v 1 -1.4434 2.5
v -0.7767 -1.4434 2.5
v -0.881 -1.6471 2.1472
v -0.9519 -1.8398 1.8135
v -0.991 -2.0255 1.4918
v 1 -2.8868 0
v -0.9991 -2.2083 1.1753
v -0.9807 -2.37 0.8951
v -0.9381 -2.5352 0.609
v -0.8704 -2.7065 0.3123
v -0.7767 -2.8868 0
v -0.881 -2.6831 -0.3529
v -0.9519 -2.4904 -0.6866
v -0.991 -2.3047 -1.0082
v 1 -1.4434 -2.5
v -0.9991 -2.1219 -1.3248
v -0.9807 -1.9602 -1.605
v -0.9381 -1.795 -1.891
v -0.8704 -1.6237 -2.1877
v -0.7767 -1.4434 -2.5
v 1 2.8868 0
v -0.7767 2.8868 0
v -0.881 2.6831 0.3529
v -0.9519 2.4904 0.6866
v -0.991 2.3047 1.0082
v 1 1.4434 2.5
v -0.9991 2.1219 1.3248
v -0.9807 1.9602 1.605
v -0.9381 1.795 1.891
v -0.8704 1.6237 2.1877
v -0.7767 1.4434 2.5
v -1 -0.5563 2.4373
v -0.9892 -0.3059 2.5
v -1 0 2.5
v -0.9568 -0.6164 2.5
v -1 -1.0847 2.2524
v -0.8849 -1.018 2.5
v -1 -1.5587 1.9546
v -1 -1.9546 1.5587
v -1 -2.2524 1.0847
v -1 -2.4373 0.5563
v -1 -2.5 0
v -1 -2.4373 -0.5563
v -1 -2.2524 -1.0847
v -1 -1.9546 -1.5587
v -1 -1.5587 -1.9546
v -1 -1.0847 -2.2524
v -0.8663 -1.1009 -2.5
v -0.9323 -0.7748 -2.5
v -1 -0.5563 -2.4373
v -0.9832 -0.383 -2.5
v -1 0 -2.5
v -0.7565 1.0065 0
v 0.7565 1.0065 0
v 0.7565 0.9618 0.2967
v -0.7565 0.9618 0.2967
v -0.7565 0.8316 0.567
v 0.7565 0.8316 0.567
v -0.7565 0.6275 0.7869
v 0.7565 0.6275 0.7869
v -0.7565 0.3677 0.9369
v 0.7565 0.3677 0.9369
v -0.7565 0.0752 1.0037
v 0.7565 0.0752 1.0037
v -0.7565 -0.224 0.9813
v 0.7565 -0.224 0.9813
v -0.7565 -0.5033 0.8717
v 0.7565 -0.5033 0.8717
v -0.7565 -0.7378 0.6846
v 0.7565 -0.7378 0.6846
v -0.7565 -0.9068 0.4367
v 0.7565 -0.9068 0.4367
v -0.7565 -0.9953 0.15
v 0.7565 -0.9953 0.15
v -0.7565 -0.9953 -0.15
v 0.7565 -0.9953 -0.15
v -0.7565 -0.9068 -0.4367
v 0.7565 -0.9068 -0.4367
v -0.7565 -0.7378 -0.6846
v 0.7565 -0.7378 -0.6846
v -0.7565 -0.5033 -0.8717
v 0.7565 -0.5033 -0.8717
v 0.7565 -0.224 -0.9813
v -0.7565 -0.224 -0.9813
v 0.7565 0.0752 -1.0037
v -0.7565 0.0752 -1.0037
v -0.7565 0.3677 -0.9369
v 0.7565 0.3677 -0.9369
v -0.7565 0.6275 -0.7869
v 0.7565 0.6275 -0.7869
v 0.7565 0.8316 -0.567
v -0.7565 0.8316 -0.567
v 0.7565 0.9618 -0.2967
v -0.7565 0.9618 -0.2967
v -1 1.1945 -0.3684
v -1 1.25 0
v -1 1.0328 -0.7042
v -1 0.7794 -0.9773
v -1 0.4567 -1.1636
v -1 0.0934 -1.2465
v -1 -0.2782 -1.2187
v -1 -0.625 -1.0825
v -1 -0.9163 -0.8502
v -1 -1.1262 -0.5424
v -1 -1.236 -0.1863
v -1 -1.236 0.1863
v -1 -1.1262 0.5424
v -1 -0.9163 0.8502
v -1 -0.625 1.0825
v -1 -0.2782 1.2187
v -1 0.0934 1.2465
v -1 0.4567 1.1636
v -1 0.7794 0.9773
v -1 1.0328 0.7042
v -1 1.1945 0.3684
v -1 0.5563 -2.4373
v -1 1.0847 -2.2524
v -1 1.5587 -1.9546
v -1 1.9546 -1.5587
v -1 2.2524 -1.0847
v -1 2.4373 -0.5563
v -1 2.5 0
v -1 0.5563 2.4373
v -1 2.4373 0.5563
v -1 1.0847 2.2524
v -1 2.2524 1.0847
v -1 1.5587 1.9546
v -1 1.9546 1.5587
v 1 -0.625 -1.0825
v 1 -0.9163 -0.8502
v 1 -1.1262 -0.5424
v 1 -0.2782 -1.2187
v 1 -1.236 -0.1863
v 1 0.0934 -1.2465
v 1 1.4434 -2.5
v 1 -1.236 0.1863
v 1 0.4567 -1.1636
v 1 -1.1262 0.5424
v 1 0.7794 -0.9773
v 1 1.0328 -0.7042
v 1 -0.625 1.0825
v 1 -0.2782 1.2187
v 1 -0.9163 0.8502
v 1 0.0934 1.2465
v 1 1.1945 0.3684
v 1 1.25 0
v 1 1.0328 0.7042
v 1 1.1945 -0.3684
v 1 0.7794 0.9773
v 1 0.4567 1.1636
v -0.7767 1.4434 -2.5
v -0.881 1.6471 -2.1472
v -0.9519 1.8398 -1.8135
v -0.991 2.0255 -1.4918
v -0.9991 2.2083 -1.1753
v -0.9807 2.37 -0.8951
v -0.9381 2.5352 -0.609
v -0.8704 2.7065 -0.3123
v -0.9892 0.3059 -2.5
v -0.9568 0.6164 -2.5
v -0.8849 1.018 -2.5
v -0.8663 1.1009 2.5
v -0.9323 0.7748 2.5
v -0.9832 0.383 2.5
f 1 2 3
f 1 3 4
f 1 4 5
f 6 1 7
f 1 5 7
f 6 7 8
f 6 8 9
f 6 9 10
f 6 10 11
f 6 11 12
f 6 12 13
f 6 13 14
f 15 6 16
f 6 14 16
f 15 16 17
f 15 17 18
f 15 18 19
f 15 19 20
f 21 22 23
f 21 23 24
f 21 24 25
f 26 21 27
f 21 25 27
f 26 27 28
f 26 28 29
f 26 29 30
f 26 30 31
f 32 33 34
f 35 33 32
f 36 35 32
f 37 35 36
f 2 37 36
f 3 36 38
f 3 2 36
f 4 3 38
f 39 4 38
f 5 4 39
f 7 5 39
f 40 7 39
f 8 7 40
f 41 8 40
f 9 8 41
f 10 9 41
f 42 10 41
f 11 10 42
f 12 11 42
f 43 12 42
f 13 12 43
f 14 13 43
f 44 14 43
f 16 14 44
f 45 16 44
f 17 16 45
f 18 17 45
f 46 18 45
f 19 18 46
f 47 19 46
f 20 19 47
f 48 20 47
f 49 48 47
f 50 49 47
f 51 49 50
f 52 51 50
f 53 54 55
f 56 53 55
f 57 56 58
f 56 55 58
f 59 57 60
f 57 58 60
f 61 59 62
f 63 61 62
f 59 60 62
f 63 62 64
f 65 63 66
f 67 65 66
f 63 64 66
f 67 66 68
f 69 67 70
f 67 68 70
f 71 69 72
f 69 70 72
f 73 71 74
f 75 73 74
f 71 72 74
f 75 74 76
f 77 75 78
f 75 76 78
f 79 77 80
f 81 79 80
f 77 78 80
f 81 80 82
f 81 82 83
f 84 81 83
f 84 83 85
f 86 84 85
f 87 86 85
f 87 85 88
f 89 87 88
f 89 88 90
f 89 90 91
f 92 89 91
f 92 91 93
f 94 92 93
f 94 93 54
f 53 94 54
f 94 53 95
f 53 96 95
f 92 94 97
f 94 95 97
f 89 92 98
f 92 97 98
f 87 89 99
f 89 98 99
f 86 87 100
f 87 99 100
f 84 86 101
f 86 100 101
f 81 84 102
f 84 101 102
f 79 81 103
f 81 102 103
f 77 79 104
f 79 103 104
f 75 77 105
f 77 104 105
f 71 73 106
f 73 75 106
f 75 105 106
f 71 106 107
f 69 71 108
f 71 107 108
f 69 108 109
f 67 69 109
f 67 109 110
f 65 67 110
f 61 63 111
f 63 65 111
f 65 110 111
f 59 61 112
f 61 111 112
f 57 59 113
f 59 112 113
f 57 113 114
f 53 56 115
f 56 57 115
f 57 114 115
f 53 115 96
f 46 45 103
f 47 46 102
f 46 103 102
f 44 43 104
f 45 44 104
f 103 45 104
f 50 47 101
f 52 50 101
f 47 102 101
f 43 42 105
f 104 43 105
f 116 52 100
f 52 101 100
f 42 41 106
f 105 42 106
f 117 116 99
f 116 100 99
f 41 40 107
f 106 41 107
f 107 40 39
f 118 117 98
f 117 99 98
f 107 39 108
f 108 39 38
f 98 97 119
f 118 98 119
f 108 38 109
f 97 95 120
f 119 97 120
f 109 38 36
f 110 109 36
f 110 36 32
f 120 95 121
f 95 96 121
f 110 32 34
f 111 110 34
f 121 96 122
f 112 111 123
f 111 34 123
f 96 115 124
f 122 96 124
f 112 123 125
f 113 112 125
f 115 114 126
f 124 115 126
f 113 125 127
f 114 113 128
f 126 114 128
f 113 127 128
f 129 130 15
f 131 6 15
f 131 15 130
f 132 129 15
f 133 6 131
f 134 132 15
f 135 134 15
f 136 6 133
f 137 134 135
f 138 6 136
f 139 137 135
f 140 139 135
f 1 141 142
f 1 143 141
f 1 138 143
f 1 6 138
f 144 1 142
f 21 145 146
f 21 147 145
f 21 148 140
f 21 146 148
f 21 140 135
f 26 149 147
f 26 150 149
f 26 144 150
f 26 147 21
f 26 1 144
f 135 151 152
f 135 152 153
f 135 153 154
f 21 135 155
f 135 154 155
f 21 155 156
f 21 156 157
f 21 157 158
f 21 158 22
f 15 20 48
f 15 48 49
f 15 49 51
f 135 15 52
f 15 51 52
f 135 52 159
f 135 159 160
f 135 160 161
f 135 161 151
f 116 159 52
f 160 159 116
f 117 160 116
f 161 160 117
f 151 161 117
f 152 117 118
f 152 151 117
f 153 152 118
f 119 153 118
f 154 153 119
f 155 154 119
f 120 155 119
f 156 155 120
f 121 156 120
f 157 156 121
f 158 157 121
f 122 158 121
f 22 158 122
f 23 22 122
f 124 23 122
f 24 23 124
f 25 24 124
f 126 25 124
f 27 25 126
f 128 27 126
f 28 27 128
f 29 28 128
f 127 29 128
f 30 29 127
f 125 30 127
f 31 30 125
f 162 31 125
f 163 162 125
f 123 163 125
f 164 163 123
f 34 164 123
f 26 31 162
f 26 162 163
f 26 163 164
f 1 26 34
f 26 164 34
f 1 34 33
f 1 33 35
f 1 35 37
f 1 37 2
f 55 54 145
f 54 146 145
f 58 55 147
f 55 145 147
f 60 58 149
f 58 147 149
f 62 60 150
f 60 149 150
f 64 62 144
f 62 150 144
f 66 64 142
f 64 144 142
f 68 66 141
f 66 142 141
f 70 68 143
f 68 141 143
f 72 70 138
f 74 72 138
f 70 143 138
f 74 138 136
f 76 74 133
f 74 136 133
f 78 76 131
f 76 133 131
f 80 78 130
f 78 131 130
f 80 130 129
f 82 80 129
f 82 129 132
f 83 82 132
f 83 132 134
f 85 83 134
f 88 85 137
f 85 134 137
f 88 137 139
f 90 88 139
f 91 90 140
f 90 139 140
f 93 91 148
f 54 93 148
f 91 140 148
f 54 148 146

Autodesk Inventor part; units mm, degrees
sketch "Sketch_1" plane through (0, 0, 0) normal (0, 0, 1) x (1, 0, 0)
  line L0 (1, 0) -> (-1, 0)
  line L1 (-1, 0) -> (-1, 2.5)
  line L2 (-1, 2.5) -> (-0.7691, 2.9)
  line L3 (-0.7691, 2.9) -> (1, 2.9)
  line L4 (1, 2.9) -> (1, 0)
  line L5 (1, 0) -> (-1, 0)
revolve "Revolution1" add sketch "Sketch_1" angle 360 about axis through (1, 0, 0) along (1, 0, 0)
sketch "Sketch_2" plane through (0, 0, 0) normal (0, 0, 1) x (1, 0, 0)
  line L0 (1, 0) -> (-1, 0)
  line L1 (-1, 0) -> (-1, 1.25)
  line L2 (-1, 1.25) -> (-0.7565, 1.0065)
  line L3 (-0.7565, 1.0065) -> (0.7565, 1.0065)
  line L4 (0.7565, 1.0065) -> (1, 1.25)
  line L5 (1, 1.25) -> (1, 0)
  line L6 (1, 0) -> (-1, 0)
revolve "Revolution2" cut sketch "Sketch_2" angle 360 about axis through (1, 0, 0) along (1, 0, 0)
thread "Thread1" size "M2.5x0.45" class "6H" standard "ISO Metric profile" full length
sketch "Sketch_3" plane through (0, 0, 0) normal (1, 0, 0) x (0, 1, 0)
  line L0 (-5, 5) -> (-5, -5)
  line L1 (-5, -5) -> (5, -5)
  line L2 (5, -5) -> (5, 5)
  line L3 (5, 5) -> (-5, 5)
  line L4 (-1.4434, 2.5) -> (-2.8868, 0)
  line L5 (-2.8868, 0) -> (-1.4434, -2.5)
  line L6 (-1.4434, -2.5) -> (1.4434, -2.5)
  line L7 (1.4434, -2.5) -> (2.8868, 0)
  line L8 (2.8868, 0) -> (1.4434, 2.5)
  line L9 (1.4434, 2.5) -> (-1.4434, 2.5)
extrude "Extrusion1" cut sketch "Sketch_3" along normal mid plane 2
ref_plane "cp_XY" through (1, 0, 0) normal (1, 0, 0) x (0, 0, -1)
ref_plane "cp_YZ" through (1, 0, 0) normal (0, 0, -1) x (0, 1, 0)
ref_plane "cp_ZX" through (1, 0, 0) normal (0, 1, 0) x (1, 0, 0)
ref_plane "nut_to_screw_XY" through (0, 0, 0) normal (1, 0, 0) x (0, 0, -1)
ref_plane "nut_to_screw_YZ" through (0, 0, 0) normal (0, 0, -1) x (0, 1, 0)
ref_plane "nut_to_screw_ZX" through (0, 0, 0) normal (0, 1, 0) x (1, 0, 0)
properties part number "SLBNR2.5" material "스테인리스스틸, 감마철"
